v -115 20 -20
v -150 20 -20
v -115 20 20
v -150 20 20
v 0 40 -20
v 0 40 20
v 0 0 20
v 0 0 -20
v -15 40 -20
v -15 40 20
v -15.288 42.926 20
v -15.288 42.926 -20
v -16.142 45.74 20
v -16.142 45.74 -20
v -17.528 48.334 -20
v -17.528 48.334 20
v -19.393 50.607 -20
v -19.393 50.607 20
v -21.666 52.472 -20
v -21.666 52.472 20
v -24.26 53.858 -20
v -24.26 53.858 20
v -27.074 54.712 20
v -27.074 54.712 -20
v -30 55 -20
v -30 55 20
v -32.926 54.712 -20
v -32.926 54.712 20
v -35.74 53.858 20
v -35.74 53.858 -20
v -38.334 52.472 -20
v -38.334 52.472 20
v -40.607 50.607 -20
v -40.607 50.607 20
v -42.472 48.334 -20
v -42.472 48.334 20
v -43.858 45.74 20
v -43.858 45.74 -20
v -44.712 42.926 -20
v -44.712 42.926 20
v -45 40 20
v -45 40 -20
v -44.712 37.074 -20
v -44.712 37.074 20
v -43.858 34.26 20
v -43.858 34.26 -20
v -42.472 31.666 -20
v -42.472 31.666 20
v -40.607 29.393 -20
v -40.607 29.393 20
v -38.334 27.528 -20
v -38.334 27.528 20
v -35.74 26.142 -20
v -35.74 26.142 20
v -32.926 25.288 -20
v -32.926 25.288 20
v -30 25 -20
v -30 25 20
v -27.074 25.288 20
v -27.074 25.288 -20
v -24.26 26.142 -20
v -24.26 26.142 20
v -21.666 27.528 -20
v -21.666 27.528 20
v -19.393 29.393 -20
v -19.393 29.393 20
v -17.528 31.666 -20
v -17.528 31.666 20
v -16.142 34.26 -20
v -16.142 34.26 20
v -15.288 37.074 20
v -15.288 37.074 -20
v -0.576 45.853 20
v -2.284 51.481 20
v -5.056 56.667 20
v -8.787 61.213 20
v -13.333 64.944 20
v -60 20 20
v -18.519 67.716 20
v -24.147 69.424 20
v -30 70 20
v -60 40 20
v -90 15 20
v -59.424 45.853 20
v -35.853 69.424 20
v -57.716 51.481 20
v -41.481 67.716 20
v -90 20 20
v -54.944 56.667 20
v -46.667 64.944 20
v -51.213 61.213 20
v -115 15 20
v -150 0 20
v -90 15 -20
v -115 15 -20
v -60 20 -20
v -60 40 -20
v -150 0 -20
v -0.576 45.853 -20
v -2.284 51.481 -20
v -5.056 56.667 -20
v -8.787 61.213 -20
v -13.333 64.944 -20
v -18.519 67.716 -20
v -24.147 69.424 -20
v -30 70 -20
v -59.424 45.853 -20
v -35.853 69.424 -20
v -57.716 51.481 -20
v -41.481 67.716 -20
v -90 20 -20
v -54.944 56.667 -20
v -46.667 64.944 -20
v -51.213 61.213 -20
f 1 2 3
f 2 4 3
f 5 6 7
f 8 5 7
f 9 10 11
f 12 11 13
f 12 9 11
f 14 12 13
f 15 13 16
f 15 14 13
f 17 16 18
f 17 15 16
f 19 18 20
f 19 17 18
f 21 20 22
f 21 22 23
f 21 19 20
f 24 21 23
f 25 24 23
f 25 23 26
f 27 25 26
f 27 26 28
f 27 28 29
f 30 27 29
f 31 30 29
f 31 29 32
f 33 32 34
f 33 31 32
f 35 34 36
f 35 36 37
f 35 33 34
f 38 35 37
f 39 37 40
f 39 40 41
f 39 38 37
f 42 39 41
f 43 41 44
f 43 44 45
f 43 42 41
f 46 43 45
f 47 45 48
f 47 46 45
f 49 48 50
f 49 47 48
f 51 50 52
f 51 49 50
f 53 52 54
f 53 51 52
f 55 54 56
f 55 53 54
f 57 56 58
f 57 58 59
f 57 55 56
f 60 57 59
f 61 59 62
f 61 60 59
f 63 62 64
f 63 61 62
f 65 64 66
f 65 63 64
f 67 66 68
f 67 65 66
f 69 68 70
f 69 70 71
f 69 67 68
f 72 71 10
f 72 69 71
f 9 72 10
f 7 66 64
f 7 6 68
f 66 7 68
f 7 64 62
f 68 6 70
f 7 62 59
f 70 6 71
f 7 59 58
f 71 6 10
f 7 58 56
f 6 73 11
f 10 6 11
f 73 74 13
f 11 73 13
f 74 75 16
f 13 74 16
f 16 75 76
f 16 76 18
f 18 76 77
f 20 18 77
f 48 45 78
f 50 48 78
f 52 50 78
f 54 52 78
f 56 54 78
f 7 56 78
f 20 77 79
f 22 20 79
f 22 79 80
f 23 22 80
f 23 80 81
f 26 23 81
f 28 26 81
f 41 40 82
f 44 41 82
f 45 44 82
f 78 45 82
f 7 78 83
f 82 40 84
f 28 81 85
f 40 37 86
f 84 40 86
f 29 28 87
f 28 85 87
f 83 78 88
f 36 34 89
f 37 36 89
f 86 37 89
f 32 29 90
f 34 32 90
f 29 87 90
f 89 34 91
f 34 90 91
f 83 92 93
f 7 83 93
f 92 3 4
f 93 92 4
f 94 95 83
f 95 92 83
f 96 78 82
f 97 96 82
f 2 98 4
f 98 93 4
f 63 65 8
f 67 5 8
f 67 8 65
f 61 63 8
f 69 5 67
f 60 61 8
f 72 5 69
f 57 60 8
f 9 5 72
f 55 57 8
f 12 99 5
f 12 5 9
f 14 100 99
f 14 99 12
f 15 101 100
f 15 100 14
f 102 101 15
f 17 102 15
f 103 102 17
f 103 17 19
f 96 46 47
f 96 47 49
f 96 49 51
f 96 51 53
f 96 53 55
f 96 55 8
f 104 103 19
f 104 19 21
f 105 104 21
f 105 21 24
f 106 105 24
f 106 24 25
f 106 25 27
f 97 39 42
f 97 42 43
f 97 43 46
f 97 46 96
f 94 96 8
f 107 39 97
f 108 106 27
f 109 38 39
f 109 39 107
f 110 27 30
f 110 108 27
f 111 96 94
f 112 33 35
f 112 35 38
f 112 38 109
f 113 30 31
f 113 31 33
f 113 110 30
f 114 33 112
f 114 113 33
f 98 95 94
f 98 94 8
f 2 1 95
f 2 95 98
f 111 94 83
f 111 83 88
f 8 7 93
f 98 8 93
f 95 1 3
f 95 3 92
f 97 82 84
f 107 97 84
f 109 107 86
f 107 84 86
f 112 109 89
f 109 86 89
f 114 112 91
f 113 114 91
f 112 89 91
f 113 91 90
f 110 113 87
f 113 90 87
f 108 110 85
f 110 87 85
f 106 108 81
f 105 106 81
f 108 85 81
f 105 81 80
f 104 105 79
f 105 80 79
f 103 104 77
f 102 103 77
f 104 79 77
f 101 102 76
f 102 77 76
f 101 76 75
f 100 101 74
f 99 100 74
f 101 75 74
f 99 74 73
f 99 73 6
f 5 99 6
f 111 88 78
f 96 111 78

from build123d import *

# Parameters (mm, degrees)
SKETCH2_R           = 15
BOSS_EXTRUDE1_DEPTH = 20


with BuildPart() as part:
    # Sketch2 → Boss-Extrude1 (new, symmetric)
    with BuildSketch(Plane.XY):
        with BuildLine():
            Line((0, 0), (-150, 0))
            Line((-150, 0), (-150, 20))
            Line((-150, 20), (-115, 20))
            Line((-115, 20), (-115, 15))
            Line((-115, 15), (-90, 15))
            Line((-90, 15), (-90, 20))
            Line((-90, 20), (-60, 20))
            Line((-60, 20), (-60, 40))
            ThreePointArc((-60, 40), (-30, 70), (0, 40))
            Line((0, 40), (0, 0))
        make_face()
        with Locations((-30, 40)):
            Circle(SKETCH2_R, mode=Mode.SUBTRACT)
    extrude(amount=BOSS_EXTRUDE1_DEPTH, both=True)


solid = part.part
